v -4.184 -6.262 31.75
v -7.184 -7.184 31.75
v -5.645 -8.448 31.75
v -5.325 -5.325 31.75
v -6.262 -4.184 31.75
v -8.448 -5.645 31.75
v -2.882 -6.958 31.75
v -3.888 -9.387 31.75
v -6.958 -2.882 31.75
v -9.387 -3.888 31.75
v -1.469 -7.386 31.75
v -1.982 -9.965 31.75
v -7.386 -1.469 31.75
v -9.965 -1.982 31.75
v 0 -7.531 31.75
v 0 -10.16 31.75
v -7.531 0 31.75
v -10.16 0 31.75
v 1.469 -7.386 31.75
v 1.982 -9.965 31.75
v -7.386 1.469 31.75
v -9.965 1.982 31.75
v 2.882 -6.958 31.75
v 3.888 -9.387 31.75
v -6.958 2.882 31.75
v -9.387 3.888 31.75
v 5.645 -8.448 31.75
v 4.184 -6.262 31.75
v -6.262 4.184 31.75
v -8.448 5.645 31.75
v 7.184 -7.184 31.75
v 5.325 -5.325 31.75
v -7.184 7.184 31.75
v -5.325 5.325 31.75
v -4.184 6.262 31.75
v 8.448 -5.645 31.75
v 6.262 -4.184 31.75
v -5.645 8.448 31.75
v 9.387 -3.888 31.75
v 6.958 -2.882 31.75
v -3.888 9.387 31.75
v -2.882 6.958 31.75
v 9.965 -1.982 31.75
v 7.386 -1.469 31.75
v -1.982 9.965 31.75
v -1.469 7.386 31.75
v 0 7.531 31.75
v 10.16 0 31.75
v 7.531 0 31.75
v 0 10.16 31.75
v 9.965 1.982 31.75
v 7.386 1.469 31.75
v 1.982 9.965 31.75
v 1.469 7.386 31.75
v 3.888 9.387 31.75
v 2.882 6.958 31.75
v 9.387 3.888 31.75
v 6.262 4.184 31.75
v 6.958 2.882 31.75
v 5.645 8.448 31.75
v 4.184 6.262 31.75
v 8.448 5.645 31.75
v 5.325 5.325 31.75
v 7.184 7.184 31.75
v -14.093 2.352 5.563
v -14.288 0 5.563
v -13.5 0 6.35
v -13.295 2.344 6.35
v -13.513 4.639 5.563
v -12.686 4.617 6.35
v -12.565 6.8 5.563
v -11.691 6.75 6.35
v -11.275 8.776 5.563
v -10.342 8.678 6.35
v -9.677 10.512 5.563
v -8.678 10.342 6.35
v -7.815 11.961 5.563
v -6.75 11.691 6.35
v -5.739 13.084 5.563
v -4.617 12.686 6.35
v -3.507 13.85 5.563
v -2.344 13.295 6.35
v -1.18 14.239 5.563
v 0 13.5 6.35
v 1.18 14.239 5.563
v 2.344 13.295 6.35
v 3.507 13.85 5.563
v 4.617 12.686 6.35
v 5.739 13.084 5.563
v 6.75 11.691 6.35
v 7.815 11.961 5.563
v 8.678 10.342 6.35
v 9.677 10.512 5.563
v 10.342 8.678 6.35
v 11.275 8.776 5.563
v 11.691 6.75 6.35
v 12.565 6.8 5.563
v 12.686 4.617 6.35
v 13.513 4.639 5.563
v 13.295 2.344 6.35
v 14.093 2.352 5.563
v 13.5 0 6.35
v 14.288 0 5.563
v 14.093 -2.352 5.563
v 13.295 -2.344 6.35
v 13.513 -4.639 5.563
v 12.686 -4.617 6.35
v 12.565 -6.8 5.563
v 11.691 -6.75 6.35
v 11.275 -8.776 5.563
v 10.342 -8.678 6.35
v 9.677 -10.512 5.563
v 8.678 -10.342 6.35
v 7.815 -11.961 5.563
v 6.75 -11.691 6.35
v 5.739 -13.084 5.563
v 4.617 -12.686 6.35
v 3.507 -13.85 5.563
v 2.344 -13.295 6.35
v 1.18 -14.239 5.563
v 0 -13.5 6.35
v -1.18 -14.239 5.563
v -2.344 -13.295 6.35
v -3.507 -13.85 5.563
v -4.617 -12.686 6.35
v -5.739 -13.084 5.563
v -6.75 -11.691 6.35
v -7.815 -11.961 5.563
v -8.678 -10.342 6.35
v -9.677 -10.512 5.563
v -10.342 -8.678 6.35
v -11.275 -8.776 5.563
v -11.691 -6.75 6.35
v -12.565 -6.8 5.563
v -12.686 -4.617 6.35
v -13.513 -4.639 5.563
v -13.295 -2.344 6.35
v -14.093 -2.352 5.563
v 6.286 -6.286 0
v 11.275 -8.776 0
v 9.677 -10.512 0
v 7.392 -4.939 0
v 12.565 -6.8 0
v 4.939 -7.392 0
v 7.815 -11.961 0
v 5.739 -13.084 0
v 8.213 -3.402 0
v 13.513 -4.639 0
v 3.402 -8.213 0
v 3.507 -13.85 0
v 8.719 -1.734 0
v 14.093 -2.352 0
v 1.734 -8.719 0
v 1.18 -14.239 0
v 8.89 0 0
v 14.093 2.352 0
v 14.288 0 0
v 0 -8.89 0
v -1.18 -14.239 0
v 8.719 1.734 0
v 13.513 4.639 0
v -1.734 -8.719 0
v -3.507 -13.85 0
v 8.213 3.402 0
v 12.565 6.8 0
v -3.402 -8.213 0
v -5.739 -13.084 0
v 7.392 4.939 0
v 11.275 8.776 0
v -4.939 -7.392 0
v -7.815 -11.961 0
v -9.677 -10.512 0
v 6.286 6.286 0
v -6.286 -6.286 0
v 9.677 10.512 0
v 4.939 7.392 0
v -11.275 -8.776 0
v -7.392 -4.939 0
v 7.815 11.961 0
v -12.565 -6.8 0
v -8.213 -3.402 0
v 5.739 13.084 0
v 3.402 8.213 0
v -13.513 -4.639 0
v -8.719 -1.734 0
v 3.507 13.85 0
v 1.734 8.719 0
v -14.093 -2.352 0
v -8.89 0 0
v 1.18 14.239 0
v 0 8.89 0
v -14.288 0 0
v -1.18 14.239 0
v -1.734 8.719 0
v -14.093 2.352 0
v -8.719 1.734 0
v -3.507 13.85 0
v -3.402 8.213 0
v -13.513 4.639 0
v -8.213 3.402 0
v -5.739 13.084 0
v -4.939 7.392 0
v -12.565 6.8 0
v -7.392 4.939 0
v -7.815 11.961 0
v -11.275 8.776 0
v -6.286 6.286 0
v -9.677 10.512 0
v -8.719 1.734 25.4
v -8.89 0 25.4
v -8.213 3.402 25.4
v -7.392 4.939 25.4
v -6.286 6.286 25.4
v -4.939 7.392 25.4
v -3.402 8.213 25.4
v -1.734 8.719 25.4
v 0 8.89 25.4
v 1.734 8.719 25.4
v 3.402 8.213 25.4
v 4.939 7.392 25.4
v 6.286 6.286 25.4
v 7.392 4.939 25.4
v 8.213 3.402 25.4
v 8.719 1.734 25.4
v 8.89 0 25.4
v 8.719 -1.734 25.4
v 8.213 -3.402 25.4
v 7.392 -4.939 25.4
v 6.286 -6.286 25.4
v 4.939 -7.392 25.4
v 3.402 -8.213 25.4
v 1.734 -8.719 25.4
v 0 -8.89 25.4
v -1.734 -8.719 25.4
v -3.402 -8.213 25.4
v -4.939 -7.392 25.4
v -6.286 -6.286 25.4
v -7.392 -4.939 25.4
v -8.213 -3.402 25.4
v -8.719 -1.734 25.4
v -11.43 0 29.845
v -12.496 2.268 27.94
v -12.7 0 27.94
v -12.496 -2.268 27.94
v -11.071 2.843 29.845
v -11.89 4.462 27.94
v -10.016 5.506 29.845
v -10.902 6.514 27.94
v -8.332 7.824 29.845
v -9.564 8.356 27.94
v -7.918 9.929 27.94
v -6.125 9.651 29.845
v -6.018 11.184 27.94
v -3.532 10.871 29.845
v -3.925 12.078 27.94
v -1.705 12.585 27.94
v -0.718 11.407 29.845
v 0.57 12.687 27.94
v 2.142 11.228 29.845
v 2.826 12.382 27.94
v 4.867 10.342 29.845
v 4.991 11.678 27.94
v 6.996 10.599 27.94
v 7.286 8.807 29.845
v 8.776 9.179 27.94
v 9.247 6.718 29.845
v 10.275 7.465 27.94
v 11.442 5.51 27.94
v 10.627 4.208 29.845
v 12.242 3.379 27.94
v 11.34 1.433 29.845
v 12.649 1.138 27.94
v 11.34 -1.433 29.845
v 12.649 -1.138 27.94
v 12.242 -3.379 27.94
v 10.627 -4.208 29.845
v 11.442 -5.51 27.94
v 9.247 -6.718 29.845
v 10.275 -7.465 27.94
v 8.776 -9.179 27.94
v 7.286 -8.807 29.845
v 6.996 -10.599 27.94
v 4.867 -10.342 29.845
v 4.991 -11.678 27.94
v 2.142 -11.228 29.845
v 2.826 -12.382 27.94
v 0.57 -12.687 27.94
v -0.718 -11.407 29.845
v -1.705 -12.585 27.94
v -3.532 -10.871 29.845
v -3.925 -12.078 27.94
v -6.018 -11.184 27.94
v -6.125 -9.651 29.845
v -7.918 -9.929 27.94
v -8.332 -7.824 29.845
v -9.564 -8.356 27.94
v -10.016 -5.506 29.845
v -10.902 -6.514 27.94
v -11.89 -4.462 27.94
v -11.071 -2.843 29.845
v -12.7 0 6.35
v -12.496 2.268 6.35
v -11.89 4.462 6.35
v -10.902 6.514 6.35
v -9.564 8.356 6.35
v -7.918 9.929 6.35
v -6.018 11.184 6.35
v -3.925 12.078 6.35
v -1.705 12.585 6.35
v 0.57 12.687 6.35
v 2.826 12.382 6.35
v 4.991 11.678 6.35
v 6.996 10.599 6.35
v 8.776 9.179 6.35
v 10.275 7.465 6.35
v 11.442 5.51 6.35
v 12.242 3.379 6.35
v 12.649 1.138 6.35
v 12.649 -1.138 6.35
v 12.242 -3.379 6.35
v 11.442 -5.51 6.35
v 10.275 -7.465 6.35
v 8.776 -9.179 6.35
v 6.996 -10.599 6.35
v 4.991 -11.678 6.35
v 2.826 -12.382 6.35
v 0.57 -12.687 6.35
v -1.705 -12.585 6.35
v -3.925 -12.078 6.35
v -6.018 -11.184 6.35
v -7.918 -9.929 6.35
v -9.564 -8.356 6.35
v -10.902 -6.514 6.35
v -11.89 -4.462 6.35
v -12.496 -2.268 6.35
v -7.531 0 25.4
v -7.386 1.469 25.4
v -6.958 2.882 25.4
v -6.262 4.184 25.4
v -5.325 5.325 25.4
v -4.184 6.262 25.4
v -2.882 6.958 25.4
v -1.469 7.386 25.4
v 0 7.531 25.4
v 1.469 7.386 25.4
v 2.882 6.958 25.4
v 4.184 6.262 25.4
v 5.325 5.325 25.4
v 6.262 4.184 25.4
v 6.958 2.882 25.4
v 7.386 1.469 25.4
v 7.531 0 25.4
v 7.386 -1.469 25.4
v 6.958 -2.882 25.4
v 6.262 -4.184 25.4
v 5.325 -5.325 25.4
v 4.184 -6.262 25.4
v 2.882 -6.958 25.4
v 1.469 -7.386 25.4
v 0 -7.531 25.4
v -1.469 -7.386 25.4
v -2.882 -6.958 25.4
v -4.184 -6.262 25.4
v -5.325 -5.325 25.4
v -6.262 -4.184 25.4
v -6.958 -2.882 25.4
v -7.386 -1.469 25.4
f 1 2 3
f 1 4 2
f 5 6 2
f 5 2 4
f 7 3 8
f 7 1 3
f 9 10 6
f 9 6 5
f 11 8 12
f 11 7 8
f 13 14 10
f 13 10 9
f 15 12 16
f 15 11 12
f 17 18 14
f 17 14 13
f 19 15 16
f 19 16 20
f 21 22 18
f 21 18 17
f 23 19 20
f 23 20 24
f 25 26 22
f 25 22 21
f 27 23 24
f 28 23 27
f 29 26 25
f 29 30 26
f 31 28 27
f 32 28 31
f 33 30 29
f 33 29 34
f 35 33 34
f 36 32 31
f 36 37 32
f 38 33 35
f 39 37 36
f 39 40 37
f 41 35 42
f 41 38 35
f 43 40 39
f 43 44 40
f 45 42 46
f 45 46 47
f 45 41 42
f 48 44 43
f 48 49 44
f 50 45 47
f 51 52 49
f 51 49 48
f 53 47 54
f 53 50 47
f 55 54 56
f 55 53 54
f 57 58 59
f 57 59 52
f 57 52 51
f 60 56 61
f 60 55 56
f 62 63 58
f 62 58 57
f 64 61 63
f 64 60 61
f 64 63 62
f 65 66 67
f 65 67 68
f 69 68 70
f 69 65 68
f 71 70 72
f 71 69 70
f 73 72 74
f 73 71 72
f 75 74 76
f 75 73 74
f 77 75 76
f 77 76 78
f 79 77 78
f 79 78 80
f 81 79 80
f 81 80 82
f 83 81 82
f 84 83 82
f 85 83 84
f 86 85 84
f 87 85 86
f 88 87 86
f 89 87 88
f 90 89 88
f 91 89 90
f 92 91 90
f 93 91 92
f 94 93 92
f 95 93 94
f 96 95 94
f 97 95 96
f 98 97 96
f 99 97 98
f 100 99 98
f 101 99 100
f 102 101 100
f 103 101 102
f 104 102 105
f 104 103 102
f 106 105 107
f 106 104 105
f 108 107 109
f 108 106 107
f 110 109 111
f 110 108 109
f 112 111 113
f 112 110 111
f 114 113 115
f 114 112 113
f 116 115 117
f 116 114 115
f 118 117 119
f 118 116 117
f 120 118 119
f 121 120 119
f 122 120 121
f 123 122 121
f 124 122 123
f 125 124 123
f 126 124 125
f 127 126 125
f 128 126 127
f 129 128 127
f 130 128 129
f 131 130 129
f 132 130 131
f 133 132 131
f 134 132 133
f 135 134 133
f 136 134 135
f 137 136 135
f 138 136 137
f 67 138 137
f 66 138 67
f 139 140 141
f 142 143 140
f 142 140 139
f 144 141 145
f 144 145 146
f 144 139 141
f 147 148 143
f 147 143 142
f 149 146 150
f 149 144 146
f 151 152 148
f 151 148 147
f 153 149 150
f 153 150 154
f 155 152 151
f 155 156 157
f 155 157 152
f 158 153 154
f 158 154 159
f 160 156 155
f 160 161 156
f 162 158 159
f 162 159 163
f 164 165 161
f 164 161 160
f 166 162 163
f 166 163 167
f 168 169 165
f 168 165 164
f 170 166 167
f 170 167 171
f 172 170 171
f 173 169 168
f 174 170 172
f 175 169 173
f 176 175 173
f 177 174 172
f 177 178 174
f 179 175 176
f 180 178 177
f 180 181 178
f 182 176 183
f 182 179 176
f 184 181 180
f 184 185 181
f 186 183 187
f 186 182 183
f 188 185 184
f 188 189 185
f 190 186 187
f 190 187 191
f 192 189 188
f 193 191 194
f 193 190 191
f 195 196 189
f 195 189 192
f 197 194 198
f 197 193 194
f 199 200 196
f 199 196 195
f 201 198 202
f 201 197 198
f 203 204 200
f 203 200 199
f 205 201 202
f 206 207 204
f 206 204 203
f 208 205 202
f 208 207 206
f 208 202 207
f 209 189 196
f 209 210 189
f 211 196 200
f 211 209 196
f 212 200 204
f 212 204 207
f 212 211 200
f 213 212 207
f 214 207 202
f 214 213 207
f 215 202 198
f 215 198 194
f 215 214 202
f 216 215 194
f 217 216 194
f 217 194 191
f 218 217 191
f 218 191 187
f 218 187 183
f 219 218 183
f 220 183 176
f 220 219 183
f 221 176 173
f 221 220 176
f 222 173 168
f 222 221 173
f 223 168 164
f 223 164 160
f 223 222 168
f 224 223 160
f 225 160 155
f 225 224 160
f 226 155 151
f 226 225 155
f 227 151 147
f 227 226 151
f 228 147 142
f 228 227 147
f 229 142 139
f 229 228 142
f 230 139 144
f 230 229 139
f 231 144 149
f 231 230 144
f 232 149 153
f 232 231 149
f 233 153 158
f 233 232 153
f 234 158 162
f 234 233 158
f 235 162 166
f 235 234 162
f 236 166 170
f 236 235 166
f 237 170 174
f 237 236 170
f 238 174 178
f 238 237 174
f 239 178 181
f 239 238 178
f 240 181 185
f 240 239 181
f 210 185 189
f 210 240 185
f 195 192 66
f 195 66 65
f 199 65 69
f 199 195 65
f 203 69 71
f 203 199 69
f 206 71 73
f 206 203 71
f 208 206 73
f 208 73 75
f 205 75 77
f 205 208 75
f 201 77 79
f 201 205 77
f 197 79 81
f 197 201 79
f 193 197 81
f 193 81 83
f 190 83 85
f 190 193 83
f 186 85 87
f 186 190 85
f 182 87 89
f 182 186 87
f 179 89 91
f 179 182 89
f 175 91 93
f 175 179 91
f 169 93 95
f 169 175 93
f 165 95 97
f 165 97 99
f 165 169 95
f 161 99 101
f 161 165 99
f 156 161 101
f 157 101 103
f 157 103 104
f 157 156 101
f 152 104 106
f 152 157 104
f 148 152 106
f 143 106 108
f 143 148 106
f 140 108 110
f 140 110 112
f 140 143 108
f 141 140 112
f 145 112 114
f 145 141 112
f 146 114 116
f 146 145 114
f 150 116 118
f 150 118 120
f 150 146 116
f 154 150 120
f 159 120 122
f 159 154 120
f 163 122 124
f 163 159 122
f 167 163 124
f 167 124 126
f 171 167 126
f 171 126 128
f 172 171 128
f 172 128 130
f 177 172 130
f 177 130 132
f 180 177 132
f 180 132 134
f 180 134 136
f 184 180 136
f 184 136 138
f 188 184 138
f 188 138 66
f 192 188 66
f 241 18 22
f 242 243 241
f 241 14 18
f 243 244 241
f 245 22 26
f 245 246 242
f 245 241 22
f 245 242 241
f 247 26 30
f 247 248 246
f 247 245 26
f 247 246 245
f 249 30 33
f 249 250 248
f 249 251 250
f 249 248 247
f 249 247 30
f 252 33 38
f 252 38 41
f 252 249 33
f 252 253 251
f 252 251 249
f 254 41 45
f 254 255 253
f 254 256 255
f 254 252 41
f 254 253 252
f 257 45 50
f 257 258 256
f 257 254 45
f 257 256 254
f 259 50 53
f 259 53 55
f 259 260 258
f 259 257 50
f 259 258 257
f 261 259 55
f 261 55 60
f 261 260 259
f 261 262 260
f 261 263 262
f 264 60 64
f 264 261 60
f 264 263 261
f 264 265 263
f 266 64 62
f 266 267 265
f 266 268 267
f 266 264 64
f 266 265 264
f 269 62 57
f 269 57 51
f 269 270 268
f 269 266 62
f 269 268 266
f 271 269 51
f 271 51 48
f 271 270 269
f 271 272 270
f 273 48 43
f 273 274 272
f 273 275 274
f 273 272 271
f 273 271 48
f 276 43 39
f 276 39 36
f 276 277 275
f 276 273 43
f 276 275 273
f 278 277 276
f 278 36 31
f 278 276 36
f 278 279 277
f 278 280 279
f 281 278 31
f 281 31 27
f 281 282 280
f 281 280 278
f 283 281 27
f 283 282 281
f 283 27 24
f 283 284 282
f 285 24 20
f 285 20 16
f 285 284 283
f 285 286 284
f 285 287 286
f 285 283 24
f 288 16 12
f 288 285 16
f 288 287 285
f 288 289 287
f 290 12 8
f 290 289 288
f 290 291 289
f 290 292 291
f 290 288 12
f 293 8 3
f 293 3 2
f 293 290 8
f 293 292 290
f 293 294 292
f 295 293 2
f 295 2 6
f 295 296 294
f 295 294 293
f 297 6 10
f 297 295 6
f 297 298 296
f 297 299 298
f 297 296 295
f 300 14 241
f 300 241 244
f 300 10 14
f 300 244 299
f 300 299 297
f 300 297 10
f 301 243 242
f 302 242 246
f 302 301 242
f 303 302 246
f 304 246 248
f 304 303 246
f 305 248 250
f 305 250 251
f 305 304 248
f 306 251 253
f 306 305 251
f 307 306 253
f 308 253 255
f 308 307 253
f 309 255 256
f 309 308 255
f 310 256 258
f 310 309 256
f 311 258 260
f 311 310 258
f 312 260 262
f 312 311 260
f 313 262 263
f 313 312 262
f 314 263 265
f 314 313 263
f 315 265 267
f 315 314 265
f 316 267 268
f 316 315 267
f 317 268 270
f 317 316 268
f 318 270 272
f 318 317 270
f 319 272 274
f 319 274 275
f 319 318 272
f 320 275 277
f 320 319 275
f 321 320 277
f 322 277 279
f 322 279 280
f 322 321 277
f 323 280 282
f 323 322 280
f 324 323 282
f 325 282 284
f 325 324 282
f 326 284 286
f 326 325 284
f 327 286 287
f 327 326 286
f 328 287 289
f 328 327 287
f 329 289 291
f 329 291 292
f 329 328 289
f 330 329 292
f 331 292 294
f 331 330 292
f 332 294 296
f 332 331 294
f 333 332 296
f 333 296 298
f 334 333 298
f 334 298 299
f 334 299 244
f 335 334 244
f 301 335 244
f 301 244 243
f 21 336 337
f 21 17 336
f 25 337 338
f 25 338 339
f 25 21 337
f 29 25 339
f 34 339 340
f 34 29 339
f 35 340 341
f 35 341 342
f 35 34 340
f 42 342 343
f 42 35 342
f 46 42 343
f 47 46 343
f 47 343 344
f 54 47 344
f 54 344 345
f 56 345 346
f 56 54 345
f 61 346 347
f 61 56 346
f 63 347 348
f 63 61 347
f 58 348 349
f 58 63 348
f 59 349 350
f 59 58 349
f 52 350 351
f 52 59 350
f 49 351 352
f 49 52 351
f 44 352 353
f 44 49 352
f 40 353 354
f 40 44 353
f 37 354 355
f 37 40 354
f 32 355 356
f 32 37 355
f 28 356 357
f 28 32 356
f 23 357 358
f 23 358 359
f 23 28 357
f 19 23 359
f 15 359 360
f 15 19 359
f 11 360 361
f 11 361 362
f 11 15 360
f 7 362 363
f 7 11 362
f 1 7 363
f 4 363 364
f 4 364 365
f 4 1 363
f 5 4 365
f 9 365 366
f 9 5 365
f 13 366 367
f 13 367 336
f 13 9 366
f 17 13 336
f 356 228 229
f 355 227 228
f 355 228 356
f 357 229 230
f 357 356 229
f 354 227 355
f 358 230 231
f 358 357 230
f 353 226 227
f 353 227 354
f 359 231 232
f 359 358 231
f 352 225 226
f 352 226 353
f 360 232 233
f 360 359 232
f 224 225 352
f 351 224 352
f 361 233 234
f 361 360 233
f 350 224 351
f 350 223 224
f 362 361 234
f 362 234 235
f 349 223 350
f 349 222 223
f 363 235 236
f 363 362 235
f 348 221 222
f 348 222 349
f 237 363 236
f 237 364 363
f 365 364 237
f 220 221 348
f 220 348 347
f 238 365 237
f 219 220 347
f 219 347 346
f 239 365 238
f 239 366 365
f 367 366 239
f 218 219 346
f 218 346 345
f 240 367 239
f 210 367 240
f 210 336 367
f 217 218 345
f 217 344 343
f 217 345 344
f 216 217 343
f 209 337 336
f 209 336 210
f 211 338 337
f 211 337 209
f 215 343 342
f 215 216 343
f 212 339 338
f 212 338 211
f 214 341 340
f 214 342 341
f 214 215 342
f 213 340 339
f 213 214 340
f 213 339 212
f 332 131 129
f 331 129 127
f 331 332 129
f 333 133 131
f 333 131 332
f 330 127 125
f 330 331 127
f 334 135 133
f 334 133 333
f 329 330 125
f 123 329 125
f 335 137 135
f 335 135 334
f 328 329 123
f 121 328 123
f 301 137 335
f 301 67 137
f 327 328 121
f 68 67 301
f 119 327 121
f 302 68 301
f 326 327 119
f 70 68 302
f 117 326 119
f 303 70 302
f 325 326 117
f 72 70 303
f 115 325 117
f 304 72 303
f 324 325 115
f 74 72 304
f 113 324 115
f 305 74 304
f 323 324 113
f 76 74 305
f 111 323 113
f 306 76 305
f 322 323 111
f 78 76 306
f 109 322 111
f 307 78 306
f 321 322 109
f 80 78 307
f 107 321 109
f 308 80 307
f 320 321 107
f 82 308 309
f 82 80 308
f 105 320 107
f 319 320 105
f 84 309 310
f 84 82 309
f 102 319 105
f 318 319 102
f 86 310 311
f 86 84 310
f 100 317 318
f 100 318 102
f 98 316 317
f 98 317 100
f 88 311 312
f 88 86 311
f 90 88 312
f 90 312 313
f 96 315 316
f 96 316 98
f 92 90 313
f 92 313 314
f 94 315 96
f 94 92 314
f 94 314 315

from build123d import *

# Parameters (mm, degrees)
F2_SIZE2 = 3.81
F2_SIZE  = 2.54
F3_SIZE  = 0.7874


with BuildPart() as f1:
    # F0 (on Front) → F1 (revolve)
    with BuildSketch(Plane.XZ):
        Polygon((-14.2875, 0), (-8.89, 0), (-8.89, 25.4), (-7.5311, 25.4), (-7.5311, 31.75), (-12.7, 31.75), (-12.7, 6.35), (-14.2875, 6.35), align=None)
    revolve(axis=Axis((0, 0, 7.331744), (0, 0, -1)))

    # F2
    f2_edges = [f1.edges().sort_by_distance(p)[0] for p in [
        (12.7, 0, 31.75),
    ]]
    chamfer(f2_edges, length=F2_SIZE, length2=F2_SIZE2)

    # F3
    f3_edges = [f1.edges().sort_by_distance(p)[0] for p in [
        (14.2875, 0, 6.35),
    ]]
    chamfer(f3_edges, length=F3_SIZE)


solid = f1.part
